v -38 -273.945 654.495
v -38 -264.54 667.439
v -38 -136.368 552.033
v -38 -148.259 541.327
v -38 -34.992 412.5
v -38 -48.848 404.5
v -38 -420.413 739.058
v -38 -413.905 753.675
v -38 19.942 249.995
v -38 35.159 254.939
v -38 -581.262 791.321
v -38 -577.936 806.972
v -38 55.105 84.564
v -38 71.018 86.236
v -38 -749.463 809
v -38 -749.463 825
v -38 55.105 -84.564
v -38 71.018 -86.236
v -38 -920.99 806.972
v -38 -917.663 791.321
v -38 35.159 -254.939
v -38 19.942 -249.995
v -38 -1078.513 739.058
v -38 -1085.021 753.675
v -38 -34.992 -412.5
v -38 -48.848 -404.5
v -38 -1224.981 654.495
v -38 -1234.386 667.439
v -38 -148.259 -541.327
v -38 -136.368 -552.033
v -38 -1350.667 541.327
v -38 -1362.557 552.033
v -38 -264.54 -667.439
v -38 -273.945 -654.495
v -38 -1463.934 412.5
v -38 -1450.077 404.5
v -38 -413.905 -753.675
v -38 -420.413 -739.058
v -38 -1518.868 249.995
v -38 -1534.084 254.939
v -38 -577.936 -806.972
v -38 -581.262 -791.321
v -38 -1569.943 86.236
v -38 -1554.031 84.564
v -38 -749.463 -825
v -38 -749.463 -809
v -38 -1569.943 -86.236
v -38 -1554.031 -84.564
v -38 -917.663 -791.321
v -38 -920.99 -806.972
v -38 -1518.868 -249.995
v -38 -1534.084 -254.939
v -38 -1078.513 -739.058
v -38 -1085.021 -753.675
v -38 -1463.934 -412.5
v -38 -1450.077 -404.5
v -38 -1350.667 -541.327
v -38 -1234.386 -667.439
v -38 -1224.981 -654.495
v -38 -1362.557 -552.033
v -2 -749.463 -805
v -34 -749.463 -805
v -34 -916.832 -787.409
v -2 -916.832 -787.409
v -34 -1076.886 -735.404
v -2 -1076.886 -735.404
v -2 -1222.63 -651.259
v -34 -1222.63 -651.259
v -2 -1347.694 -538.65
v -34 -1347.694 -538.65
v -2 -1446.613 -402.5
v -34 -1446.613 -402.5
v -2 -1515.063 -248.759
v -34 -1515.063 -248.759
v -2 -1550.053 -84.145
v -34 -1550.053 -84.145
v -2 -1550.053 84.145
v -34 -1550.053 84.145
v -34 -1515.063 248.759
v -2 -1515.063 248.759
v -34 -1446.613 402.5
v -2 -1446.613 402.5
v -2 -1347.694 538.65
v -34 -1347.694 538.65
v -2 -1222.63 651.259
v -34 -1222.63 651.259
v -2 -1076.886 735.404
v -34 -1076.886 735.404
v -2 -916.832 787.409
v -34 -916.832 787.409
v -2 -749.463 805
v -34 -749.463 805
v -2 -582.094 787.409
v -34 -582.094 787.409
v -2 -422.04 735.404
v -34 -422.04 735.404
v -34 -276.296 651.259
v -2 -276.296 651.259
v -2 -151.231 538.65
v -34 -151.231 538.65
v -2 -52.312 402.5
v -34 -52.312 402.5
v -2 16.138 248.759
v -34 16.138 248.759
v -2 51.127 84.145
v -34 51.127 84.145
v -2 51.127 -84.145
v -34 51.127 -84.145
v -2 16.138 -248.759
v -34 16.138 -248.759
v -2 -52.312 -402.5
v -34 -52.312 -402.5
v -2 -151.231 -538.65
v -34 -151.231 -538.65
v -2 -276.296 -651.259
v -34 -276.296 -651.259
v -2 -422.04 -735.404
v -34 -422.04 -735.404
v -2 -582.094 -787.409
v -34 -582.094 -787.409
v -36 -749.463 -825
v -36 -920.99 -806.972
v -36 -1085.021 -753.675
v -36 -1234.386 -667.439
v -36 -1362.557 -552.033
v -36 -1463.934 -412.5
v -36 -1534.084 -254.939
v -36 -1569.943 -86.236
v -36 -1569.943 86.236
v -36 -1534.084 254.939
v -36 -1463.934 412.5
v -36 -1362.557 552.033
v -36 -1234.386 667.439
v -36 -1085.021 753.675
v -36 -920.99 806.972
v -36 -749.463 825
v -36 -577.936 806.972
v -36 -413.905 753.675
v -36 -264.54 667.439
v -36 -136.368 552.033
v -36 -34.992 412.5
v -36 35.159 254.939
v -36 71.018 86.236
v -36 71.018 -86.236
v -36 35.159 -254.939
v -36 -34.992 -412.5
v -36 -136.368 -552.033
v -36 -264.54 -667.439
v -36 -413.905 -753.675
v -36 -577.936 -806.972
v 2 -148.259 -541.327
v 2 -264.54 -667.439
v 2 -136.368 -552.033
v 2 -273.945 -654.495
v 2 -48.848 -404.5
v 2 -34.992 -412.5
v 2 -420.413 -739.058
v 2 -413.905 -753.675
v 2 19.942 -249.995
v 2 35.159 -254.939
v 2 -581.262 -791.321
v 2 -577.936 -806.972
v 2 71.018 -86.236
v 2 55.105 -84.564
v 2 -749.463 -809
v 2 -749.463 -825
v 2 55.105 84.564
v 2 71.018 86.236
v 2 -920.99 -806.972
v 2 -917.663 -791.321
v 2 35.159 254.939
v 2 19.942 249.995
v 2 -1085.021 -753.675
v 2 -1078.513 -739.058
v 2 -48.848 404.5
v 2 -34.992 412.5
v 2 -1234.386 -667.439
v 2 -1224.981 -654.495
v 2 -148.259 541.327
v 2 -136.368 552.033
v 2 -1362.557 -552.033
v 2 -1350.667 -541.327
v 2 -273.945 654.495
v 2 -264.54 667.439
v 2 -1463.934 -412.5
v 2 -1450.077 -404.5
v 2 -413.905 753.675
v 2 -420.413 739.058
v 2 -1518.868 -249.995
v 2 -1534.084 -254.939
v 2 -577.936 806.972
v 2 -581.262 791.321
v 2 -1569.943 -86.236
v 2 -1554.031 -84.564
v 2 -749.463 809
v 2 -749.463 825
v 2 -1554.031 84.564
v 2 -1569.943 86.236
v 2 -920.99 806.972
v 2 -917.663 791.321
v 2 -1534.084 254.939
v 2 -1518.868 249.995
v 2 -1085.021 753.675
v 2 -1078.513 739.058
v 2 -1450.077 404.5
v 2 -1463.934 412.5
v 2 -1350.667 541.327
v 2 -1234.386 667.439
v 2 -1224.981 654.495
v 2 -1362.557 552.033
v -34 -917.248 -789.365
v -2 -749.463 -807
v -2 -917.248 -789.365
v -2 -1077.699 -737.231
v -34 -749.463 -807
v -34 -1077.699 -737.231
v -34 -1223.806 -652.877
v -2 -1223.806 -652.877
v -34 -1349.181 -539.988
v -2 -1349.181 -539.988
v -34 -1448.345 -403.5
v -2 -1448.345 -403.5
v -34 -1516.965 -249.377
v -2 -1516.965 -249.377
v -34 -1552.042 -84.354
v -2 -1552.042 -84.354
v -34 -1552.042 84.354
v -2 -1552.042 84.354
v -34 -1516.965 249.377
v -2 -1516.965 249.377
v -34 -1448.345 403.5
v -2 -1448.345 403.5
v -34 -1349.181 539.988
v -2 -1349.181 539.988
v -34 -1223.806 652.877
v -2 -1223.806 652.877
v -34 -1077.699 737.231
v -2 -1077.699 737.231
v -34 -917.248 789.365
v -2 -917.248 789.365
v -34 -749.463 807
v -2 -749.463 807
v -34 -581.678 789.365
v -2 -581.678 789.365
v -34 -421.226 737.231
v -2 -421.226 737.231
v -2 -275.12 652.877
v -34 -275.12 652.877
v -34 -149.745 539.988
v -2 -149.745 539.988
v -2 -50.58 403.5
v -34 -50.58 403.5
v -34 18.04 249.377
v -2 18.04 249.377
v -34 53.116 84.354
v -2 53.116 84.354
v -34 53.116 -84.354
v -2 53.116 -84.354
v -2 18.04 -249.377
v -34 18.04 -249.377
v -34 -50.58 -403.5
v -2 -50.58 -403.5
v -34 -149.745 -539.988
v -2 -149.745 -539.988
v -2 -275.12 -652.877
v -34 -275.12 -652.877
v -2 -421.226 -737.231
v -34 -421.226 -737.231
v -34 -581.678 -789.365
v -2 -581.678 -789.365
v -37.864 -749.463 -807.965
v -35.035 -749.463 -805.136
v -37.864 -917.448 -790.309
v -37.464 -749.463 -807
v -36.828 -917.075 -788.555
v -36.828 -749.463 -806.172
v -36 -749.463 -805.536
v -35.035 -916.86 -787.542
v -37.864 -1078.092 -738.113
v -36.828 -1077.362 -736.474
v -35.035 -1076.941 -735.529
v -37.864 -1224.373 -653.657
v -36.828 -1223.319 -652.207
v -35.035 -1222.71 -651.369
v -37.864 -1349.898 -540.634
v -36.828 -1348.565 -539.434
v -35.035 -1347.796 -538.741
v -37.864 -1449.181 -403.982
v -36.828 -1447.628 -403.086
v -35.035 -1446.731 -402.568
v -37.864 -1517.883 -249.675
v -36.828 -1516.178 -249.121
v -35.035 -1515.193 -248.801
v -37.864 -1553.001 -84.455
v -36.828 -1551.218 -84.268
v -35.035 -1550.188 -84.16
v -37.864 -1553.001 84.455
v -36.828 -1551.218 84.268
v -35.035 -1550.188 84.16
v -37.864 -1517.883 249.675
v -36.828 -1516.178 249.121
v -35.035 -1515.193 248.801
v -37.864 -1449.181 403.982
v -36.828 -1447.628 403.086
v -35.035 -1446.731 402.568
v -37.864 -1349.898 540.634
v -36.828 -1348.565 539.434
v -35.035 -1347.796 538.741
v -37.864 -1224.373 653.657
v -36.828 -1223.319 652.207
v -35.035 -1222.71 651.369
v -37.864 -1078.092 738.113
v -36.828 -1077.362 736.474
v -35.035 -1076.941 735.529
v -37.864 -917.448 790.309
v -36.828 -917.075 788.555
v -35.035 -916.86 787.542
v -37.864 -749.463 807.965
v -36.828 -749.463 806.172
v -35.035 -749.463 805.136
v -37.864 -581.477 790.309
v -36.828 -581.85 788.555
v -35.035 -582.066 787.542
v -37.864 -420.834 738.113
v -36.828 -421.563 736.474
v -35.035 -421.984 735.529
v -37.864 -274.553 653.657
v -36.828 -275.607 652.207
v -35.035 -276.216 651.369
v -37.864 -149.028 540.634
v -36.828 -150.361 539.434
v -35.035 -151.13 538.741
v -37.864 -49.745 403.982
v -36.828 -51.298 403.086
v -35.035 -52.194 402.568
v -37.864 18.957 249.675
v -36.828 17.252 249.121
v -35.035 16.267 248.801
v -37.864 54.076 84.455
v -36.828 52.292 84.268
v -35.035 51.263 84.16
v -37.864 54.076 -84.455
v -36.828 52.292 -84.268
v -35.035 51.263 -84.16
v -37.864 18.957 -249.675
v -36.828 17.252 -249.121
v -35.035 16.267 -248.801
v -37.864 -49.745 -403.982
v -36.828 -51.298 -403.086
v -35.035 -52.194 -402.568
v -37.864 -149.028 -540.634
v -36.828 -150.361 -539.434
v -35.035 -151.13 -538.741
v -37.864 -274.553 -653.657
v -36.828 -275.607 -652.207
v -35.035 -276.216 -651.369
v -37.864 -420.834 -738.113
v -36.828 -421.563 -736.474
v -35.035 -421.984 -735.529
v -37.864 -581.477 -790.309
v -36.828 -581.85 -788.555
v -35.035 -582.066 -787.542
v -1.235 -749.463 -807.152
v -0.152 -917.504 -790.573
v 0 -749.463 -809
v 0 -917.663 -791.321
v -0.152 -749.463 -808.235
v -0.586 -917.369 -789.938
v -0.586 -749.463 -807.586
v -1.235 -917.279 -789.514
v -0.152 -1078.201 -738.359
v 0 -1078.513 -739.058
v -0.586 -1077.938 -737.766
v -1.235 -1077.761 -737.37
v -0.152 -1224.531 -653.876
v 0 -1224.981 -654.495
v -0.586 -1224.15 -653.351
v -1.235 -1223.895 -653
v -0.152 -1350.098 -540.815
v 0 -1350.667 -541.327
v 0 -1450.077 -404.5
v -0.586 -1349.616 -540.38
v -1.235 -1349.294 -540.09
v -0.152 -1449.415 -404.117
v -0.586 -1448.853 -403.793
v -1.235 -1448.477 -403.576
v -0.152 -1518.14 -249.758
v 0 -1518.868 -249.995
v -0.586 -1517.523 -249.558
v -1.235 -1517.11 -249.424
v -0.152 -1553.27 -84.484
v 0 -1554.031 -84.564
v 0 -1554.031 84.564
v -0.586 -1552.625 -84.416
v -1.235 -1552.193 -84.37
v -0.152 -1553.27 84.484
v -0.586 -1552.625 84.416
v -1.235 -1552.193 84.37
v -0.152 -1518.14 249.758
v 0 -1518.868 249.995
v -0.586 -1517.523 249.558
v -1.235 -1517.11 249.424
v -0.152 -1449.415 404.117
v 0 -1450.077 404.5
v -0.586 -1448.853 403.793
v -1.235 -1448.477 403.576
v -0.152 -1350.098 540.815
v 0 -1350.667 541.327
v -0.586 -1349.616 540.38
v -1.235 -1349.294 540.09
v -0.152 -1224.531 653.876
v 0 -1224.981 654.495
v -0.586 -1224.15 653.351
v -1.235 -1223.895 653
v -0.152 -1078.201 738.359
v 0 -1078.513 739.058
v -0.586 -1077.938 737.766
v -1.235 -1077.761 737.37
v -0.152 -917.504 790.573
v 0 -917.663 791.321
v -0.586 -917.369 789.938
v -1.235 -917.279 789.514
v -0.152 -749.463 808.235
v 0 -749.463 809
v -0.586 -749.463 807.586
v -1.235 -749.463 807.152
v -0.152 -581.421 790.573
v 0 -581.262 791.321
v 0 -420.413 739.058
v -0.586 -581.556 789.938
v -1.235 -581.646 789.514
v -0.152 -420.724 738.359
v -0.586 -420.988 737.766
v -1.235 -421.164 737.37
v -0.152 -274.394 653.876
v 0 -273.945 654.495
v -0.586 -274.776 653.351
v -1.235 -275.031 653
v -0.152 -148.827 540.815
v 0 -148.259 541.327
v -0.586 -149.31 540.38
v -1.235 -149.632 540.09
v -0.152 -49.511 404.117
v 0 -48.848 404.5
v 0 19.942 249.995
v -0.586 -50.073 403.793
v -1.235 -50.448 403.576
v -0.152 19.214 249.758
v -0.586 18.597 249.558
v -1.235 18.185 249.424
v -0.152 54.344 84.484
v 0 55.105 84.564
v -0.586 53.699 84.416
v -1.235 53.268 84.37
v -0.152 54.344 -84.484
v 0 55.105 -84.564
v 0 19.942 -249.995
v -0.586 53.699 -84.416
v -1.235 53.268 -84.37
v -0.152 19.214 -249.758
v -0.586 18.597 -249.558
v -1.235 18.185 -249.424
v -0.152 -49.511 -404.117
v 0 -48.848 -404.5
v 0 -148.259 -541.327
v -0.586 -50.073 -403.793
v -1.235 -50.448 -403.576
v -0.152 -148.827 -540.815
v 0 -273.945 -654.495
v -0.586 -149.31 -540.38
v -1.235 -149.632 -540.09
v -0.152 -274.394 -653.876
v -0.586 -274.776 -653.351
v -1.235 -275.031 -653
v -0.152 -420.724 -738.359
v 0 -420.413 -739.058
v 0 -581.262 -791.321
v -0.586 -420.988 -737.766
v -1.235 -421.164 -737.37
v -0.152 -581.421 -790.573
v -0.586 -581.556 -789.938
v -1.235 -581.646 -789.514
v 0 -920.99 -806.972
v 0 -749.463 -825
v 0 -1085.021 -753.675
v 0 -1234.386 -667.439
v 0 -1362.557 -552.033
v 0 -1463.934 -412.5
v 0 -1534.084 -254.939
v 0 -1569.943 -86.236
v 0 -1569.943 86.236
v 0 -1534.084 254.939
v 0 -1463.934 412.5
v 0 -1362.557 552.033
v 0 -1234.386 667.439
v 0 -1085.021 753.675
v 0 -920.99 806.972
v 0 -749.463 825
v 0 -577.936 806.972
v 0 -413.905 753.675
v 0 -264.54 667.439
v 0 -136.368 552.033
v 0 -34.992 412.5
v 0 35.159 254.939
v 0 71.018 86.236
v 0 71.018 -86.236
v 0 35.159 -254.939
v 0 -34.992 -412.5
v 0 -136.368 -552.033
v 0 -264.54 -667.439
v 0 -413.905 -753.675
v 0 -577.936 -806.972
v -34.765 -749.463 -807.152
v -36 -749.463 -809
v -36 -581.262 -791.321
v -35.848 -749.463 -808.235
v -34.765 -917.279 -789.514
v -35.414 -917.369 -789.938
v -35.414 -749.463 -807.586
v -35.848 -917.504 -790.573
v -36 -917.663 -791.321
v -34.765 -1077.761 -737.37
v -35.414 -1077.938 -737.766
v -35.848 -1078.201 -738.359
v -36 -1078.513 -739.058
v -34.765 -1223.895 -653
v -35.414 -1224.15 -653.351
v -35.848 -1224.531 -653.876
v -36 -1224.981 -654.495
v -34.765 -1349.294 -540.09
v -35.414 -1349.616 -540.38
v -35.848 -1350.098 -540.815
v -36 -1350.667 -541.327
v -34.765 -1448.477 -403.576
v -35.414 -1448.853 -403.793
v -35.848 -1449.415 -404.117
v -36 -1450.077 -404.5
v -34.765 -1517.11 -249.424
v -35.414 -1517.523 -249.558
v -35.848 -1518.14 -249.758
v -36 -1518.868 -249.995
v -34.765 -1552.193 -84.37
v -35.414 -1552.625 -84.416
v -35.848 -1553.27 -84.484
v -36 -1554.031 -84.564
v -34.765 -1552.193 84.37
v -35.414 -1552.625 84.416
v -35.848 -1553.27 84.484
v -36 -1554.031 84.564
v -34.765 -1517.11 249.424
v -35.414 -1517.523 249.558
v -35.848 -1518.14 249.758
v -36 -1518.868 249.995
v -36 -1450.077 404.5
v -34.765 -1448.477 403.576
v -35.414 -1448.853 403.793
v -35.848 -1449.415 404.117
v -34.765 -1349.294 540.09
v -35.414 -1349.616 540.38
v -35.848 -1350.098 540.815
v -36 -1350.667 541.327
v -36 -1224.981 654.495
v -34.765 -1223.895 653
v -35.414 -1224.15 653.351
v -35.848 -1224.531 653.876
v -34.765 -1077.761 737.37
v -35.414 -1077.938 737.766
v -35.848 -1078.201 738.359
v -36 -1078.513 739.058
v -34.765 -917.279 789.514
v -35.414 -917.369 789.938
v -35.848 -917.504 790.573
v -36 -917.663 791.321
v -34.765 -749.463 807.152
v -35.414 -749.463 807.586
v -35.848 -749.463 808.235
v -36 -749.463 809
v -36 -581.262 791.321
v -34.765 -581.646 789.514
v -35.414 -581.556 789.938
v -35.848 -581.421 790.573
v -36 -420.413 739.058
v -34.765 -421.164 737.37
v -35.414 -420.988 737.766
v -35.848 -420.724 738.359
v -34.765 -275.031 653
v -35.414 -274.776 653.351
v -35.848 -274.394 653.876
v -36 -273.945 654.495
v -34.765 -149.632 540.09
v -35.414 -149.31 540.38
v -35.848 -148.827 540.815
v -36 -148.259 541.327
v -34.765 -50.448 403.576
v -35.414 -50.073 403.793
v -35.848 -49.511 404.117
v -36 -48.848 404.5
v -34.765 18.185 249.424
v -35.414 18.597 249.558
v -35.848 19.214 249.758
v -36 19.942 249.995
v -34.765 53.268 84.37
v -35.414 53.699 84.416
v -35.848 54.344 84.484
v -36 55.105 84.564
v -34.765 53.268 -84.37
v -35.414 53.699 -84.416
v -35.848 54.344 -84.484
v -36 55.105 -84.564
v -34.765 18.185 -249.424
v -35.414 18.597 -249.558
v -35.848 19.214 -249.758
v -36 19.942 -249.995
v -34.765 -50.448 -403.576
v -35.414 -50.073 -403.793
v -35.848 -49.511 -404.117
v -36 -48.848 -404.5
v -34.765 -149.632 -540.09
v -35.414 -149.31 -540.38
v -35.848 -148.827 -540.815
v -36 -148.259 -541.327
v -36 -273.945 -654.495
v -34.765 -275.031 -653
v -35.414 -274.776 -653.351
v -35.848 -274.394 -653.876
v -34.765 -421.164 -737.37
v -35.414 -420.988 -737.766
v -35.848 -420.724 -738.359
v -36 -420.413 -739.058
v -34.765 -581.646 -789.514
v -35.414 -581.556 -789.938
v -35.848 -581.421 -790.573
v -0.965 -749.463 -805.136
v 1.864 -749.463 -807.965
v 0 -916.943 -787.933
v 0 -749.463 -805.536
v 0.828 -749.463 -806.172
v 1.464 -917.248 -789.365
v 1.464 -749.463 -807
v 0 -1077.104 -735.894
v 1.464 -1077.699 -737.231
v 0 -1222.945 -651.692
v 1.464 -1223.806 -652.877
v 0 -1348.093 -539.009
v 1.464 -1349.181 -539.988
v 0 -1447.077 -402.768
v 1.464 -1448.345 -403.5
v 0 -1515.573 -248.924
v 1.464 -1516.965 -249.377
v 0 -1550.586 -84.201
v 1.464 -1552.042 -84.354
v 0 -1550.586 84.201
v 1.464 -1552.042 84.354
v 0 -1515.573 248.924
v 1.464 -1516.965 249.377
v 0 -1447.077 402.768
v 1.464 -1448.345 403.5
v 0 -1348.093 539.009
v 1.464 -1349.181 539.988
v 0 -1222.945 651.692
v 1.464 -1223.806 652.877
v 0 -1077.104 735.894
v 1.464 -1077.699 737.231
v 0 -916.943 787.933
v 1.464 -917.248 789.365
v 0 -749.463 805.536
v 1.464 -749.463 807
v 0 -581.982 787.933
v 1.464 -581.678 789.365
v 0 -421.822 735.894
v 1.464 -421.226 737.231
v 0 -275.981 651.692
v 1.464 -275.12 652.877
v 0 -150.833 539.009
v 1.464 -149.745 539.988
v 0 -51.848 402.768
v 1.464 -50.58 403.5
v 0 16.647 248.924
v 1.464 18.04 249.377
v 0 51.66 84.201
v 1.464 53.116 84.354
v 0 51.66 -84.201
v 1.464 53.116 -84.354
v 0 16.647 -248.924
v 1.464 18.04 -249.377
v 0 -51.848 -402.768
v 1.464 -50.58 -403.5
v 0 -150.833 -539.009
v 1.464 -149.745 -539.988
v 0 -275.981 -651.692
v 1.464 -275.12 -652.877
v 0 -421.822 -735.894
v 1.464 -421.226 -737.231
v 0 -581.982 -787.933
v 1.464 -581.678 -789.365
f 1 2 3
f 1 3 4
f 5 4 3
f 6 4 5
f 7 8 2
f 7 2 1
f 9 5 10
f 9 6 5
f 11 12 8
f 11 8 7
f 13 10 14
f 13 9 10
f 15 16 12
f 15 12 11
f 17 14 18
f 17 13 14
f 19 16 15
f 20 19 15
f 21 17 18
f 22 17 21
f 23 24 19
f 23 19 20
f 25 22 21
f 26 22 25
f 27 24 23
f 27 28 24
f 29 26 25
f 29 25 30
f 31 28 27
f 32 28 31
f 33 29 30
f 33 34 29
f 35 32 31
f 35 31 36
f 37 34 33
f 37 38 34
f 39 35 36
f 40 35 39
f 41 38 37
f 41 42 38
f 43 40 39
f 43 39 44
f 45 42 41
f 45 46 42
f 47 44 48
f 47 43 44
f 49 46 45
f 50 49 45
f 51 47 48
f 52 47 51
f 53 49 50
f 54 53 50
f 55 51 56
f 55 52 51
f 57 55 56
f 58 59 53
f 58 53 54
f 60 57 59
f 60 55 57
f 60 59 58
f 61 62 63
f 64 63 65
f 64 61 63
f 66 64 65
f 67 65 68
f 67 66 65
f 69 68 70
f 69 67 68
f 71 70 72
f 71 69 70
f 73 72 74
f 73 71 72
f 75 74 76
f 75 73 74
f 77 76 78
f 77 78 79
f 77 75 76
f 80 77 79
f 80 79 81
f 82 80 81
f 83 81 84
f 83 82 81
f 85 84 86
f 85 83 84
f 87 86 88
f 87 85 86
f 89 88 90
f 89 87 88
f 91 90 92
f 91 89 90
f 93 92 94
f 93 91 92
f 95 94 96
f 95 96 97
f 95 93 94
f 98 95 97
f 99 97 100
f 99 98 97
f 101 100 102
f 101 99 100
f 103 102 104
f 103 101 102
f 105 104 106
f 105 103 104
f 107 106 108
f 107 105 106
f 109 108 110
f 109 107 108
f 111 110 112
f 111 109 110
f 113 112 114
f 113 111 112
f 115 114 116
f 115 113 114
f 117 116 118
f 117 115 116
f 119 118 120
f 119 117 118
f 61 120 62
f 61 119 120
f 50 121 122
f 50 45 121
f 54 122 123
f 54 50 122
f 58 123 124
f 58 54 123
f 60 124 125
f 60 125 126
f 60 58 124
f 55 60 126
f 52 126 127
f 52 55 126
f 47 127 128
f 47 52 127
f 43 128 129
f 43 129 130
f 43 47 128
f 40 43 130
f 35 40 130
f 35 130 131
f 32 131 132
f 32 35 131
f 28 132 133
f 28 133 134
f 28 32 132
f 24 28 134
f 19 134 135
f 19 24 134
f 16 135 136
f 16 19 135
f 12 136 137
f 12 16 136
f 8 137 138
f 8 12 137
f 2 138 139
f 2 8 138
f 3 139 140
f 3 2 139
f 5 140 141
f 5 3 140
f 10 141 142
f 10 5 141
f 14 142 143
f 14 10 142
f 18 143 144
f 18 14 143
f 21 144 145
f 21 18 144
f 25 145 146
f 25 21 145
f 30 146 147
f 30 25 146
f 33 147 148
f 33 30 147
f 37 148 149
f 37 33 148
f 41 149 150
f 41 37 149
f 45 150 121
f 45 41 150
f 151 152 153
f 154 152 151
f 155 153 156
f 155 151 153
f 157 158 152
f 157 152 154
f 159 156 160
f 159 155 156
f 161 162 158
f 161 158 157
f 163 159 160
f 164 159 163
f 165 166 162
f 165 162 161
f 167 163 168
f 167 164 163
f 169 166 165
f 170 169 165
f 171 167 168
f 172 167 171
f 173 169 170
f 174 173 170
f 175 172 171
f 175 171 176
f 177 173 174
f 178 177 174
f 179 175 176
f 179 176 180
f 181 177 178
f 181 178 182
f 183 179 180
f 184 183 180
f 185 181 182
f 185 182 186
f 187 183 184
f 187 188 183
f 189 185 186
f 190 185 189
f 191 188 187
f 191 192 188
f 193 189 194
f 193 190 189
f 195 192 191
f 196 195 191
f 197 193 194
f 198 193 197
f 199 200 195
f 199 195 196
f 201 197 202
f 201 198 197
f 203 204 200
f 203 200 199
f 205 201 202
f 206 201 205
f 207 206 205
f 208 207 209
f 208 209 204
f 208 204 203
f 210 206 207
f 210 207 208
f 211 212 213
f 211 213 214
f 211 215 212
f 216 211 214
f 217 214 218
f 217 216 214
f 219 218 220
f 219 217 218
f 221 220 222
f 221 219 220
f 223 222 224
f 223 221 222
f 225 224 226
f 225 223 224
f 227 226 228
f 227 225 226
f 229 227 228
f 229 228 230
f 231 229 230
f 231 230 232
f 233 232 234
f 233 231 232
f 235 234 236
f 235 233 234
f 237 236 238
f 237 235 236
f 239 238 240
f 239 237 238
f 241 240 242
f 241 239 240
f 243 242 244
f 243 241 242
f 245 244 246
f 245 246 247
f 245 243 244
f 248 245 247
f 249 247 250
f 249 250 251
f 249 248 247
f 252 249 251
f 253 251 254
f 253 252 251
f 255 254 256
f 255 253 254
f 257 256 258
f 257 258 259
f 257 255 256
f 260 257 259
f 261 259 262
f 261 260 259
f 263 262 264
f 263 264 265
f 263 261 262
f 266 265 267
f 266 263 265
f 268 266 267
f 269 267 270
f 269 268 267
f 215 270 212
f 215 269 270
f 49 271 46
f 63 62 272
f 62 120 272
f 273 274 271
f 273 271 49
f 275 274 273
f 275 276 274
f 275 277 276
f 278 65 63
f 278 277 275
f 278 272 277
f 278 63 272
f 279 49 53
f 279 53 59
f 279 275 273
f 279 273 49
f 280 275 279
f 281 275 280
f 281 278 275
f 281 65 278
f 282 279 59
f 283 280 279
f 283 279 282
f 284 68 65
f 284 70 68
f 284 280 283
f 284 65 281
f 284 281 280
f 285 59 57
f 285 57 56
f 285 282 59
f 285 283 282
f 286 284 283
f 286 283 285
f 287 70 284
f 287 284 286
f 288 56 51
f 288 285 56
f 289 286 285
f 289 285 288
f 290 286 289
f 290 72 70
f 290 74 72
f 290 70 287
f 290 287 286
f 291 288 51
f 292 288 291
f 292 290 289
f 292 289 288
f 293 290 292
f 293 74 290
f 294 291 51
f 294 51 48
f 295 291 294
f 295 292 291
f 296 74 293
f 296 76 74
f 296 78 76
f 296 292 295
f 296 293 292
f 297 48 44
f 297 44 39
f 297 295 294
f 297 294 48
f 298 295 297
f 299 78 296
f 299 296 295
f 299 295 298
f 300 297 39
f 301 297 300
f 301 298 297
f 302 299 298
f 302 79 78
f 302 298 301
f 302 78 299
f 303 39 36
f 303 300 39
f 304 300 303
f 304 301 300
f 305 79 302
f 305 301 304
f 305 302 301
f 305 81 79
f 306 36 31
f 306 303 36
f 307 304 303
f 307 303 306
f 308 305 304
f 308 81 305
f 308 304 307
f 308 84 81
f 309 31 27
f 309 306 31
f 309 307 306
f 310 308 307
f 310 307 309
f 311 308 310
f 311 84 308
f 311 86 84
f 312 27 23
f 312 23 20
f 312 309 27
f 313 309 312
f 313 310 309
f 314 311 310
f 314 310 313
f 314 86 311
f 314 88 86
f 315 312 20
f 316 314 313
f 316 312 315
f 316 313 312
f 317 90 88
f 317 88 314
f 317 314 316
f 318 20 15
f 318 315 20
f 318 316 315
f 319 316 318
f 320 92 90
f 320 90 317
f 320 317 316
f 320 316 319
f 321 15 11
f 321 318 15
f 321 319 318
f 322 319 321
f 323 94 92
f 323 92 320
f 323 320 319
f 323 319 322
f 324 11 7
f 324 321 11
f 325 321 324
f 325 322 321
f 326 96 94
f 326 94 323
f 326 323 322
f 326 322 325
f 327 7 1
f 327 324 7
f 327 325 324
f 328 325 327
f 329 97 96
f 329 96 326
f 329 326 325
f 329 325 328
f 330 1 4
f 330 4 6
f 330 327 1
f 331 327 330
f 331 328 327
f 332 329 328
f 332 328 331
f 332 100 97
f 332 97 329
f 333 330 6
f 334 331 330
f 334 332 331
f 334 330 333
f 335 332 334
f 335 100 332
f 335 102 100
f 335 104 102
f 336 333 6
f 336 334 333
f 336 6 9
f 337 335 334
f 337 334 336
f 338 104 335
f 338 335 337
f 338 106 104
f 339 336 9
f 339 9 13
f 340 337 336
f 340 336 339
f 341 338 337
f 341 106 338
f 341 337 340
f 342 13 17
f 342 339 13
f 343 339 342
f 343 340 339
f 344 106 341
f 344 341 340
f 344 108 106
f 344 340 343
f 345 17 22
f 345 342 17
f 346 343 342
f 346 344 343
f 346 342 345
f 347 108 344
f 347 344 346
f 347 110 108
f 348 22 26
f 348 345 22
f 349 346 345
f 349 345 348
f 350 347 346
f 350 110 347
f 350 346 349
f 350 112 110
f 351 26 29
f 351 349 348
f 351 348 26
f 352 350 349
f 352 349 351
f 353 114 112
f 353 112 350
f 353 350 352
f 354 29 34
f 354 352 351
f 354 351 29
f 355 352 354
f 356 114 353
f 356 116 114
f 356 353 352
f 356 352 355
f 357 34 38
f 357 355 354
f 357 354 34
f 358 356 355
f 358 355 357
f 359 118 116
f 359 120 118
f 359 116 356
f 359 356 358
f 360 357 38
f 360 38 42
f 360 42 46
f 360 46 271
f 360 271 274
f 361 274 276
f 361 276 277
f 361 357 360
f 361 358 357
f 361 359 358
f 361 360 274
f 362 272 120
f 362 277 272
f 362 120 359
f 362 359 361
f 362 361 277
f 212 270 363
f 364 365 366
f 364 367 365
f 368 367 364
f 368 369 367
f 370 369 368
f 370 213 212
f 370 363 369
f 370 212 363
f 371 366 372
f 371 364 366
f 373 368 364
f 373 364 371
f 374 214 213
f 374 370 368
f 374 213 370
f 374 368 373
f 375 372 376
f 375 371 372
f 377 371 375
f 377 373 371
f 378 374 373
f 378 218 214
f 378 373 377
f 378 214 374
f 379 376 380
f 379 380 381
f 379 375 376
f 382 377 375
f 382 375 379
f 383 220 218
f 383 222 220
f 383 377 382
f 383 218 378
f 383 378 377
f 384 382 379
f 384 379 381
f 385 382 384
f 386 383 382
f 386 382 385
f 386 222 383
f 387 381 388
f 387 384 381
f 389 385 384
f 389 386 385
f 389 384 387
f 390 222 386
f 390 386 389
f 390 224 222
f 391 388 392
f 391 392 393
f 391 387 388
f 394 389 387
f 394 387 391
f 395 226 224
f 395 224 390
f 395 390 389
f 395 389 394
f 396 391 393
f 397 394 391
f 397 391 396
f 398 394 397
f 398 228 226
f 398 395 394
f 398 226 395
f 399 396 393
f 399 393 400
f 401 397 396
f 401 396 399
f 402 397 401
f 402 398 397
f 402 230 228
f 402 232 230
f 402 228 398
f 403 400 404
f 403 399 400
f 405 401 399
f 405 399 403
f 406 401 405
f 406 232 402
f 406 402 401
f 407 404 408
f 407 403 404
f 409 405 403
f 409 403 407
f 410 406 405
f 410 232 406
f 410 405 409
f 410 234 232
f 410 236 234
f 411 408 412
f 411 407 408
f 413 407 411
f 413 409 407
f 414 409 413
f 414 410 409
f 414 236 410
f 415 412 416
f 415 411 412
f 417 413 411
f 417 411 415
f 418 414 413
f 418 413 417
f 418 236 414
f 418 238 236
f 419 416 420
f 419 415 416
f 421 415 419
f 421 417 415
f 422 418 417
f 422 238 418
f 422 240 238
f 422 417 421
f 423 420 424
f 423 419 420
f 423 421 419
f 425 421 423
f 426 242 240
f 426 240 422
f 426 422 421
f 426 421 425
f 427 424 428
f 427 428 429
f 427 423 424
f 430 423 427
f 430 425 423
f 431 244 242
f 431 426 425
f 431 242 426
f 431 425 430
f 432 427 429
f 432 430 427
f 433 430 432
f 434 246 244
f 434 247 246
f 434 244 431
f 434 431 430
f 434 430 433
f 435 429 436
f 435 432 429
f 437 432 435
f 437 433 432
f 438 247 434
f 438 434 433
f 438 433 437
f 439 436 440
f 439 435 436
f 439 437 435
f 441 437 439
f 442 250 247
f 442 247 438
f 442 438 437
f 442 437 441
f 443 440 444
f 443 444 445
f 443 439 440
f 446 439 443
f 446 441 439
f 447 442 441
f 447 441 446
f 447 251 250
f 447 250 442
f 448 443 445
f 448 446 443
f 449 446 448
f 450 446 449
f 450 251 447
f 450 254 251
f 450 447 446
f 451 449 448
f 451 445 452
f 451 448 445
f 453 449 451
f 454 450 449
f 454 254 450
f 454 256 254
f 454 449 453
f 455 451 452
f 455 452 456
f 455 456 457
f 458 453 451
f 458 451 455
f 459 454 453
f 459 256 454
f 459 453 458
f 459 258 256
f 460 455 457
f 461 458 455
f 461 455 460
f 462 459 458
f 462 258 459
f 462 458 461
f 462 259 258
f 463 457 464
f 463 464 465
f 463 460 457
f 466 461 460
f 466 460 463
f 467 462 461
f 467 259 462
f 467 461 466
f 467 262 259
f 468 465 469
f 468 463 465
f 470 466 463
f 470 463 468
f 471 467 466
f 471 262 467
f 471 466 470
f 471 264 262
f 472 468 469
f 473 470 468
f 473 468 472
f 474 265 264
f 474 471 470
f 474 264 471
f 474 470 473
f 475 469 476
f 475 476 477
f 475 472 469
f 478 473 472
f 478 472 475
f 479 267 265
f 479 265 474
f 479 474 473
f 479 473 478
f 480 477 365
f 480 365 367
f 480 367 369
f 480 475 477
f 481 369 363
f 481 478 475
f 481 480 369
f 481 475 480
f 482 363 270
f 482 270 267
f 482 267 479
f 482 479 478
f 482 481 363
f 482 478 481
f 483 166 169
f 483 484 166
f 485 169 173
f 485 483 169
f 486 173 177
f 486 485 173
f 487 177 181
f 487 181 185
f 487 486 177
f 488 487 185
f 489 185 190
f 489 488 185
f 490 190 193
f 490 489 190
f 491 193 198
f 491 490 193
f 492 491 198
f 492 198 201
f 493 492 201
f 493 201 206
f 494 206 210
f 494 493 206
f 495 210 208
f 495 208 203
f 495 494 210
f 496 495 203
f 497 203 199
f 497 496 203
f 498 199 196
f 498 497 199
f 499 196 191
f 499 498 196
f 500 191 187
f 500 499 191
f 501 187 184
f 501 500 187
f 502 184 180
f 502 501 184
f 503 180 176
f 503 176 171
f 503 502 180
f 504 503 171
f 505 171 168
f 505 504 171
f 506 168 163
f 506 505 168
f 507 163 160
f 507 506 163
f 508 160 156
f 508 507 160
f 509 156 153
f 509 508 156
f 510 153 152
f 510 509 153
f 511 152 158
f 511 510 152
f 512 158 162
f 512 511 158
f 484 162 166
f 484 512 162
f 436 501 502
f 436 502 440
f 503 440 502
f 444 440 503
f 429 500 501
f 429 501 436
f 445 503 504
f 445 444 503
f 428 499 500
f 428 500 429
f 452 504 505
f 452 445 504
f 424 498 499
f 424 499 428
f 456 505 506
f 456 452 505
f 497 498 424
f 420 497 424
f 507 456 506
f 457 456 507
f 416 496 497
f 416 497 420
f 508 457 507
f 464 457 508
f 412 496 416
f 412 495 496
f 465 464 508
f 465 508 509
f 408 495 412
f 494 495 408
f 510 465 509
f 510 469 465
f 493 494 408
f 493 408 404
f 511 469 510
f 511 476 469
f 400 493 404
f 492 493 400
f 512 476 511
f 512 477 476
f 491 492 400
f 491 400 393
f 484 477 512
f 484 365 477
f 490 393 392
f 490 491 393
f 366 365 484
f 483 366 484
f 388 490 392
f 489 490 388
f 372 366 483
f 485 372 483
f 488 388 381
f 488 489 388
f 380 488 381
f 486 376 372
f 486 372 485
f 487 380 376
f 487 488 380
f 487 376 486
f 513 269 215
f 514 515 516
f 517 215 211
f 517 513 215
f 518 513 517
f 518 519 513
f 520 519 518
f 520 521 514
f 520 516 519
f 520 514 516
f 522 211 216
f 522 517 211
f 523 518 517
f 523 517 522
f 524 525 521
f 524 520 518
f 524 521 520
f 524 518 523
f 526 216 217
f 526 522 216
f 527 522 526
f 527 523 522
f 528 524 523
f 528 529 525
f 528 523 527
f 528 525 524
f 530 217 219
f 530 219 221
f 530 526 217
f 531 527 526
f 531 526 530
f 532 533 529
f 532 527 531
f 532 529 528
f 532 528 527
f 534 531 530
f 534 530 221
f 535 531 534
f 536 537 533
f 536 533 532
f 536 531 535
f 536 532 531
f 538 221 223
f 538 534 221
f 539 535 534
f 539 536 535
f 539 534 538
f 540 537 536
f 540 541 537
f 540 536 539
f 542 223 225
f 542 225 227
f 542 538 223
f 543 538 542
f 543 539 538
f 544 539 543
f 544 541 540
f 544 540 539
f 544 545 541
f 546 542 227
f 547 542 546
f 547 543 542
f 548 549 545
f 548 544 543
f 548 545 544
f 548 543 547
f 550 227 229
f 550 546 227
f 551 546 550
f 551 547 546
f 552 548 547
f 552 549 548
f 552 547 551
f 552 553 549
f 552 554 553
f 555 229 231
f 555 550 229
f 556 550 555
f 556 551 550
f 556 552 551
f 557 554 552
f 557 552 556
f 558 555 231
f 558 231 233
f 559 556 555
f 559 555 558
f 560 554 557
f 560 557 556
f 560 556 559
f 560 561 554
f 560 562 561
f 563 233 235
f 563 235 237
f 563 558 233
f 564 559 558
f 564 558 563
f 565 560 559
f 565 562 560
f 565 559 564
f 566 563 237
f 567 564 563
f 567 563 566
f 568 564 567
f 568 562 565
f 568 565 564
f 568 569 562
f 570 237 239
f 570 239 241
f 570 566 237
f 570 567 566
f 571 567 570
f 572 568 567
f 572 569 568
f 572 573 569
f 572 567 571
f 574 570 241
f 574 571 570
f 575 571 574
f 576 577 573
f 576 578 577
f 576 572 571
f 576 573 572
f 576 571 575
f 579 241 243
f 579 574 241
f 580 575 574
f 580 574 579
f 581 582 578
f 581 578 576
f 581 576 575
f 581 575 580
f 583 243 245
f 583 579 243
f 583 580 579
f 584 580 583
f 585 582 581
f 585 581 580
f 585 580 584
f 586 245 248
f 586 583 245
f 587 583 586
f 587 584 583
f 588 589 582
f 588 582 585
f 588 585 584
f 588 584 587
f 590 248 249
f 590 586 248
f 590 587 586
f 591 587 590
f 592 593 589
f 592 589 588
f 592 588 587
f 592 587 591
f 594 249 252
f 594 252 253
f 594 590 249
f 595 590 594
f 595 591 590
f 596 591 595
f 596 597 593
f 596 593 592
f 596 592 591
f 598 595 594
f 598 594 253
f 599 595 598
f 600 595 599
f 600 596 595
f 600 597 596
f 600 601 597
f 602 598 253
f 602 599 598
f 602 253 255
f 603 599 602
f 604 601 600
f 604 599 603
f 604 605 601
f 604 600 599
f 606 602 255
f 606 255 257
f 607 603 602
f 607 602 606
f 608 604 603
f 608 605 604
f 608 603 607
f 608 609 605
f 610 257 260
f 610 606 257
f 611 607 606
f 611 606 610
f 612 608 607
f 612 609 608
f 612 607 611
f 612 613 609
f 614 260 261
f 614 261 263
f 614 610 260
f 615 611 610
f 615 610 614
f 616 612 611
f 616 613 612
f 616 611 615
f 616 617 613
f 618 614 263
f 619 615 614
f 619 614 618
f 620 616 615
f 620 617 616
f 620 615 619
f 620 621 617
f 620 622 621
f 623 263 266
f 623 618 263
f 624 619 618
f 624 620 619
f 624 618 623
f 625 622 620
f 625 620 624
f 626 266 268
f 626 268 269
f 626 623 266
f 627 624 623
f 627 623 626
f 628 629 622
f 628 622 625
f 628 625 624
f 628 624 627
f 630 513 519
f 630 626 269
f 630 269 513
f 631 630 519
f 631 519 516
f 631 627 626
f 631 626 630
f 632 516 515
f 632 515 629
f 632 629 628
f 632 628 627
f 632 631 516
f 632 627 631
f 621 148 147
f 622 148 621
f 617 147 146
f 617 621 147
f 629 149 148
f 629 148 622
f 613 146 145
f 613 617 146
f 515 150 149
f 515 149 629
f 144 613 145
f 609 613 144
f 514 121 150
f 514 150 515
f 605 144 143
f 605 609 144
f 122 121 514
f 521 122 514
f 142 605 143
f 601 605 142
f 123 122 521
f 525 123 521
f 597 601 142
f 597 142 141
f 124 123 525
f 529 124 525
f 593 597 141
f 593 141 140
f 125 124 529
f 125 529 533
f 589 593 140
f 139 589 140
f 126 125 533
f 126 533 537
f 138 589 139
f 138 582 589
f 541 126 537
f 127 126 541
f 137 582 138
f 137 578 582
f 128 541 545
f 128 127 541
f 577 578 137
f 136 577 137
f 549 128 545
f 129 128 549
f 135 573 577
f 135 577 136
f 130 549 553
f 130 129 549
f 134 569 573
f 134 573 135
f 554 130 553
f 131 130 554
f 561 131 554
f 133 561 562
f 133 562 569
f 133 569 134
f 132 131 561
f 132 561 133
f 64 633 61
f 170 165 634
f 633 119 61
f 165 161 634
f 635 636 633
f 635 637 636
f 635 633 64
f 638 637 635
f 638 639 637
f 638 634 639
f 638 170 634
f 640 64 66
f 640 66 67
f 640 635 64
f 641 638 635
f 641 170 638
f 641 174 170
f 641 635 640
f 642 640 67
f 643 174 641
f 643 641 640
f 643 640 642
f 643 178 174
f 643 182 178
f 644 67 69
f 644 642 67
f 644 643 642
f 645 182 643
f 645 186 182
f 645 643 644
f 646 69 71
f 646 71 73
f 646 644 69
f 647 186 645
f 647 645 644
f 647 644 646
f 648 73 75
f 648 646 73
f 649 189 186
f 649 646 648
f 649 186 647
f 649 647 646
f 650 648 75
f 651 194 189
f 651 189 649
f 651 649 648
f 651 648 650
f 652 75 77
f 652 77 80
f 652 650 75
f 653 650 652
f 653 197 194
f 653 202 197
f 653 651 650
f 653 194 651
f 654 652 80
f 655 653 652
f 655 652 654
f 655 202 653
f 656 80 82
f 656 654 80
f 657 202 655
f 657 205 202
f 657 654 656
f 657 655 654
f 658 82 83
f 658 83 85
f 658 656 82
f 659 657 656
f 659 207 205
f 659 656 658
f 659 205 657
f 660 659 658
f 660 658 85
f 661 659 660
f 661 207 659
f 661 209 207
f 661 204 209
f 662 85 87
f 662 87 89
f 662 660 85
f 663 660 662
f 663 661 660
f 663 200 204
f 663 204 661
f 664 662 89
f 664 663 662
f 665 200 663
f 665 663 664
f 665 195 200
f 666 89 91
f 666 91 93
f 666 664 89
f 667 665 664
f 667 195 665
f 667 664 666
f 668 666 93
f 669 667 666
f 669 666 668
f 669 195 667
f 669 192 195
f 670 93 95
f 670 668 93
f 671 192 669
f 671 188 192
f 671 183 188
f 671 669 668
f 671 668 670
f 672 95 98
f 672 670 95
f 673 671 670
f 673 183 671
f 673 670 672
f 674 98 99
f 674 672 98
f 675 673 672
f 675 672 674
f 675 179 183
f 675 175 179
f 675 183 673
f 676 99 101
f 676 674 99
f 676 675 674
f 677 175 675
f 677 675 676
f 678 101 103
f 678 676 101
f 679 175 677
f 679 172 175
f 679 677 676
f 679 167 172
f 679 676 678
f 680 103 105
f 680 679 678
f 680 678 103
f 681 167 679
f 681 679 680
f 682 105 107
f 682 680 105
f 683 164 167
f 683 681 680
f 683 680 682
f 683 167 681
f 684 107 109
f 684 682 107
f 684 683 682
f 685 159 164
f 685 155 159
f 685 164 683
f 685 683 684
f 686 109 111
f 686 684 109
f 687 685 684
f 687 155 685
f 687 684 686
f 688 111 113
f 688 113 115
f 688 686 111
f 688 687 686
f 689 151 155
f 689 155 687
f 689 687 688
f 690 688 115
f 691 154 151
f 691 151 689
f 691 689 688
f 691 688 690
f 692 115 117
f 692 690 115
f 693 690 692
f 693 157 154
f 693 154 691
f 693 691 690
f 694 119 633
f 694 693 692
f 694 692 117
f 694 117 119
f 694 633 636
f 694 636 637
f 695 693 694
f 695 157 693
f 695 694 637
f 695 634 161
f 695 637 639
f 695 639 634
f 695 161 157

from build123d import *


with BuildPart() as part:
    # Sketch1 → Revolve1 (revolve)
    with BuildSketch(Plane.XY, mode=Mode.PRIVATE) as revolve1_sk:
        with BuildLine():
            Line((-38, 75.537190083), (-38, 59.537190083))
            ThreePointArc((-38, 59.537190083), (-36.828427125, 56.708762958), (-34, 55.537190083))
            Line((-34, 55.537190083), (-2, 55.537190083))
            ThreePointArc((-2, 55.537190083), (0.828427125, 56.708762958), (2, 59.537190083))
            Line((2, 59.537190083), (2, 75.537190083))
            Line((2, 75.537190083), (0, 75.537190083))
            Line((0, 75.537190083), (0, 59.537190083))
            ThreePointArc((0, 59.537190083), (-0.585786438, 58.12297652), (-2, 57.537190083))
            Line((-2, 57.537190083), (-34, 57.537190083))
            ThreePointArc((-34, 57.537190083), (-35.414213562, 58.12297652), (-36, 59.537190083))
            Line((-36, 59.537190083), (-36, 75.537190083))
            Line((-36, 75.537190083), (-38, 75.537190083))
        make_face()
    revolve(revolve1_sk.sketch.rotate(Axis((63.944474241, -749.462809917, 0), (-1, 0, 0)), 90), axis=Axis((63.944474241, -749.462809917, 0), (-1, 0, 0)))


solid = part.part
